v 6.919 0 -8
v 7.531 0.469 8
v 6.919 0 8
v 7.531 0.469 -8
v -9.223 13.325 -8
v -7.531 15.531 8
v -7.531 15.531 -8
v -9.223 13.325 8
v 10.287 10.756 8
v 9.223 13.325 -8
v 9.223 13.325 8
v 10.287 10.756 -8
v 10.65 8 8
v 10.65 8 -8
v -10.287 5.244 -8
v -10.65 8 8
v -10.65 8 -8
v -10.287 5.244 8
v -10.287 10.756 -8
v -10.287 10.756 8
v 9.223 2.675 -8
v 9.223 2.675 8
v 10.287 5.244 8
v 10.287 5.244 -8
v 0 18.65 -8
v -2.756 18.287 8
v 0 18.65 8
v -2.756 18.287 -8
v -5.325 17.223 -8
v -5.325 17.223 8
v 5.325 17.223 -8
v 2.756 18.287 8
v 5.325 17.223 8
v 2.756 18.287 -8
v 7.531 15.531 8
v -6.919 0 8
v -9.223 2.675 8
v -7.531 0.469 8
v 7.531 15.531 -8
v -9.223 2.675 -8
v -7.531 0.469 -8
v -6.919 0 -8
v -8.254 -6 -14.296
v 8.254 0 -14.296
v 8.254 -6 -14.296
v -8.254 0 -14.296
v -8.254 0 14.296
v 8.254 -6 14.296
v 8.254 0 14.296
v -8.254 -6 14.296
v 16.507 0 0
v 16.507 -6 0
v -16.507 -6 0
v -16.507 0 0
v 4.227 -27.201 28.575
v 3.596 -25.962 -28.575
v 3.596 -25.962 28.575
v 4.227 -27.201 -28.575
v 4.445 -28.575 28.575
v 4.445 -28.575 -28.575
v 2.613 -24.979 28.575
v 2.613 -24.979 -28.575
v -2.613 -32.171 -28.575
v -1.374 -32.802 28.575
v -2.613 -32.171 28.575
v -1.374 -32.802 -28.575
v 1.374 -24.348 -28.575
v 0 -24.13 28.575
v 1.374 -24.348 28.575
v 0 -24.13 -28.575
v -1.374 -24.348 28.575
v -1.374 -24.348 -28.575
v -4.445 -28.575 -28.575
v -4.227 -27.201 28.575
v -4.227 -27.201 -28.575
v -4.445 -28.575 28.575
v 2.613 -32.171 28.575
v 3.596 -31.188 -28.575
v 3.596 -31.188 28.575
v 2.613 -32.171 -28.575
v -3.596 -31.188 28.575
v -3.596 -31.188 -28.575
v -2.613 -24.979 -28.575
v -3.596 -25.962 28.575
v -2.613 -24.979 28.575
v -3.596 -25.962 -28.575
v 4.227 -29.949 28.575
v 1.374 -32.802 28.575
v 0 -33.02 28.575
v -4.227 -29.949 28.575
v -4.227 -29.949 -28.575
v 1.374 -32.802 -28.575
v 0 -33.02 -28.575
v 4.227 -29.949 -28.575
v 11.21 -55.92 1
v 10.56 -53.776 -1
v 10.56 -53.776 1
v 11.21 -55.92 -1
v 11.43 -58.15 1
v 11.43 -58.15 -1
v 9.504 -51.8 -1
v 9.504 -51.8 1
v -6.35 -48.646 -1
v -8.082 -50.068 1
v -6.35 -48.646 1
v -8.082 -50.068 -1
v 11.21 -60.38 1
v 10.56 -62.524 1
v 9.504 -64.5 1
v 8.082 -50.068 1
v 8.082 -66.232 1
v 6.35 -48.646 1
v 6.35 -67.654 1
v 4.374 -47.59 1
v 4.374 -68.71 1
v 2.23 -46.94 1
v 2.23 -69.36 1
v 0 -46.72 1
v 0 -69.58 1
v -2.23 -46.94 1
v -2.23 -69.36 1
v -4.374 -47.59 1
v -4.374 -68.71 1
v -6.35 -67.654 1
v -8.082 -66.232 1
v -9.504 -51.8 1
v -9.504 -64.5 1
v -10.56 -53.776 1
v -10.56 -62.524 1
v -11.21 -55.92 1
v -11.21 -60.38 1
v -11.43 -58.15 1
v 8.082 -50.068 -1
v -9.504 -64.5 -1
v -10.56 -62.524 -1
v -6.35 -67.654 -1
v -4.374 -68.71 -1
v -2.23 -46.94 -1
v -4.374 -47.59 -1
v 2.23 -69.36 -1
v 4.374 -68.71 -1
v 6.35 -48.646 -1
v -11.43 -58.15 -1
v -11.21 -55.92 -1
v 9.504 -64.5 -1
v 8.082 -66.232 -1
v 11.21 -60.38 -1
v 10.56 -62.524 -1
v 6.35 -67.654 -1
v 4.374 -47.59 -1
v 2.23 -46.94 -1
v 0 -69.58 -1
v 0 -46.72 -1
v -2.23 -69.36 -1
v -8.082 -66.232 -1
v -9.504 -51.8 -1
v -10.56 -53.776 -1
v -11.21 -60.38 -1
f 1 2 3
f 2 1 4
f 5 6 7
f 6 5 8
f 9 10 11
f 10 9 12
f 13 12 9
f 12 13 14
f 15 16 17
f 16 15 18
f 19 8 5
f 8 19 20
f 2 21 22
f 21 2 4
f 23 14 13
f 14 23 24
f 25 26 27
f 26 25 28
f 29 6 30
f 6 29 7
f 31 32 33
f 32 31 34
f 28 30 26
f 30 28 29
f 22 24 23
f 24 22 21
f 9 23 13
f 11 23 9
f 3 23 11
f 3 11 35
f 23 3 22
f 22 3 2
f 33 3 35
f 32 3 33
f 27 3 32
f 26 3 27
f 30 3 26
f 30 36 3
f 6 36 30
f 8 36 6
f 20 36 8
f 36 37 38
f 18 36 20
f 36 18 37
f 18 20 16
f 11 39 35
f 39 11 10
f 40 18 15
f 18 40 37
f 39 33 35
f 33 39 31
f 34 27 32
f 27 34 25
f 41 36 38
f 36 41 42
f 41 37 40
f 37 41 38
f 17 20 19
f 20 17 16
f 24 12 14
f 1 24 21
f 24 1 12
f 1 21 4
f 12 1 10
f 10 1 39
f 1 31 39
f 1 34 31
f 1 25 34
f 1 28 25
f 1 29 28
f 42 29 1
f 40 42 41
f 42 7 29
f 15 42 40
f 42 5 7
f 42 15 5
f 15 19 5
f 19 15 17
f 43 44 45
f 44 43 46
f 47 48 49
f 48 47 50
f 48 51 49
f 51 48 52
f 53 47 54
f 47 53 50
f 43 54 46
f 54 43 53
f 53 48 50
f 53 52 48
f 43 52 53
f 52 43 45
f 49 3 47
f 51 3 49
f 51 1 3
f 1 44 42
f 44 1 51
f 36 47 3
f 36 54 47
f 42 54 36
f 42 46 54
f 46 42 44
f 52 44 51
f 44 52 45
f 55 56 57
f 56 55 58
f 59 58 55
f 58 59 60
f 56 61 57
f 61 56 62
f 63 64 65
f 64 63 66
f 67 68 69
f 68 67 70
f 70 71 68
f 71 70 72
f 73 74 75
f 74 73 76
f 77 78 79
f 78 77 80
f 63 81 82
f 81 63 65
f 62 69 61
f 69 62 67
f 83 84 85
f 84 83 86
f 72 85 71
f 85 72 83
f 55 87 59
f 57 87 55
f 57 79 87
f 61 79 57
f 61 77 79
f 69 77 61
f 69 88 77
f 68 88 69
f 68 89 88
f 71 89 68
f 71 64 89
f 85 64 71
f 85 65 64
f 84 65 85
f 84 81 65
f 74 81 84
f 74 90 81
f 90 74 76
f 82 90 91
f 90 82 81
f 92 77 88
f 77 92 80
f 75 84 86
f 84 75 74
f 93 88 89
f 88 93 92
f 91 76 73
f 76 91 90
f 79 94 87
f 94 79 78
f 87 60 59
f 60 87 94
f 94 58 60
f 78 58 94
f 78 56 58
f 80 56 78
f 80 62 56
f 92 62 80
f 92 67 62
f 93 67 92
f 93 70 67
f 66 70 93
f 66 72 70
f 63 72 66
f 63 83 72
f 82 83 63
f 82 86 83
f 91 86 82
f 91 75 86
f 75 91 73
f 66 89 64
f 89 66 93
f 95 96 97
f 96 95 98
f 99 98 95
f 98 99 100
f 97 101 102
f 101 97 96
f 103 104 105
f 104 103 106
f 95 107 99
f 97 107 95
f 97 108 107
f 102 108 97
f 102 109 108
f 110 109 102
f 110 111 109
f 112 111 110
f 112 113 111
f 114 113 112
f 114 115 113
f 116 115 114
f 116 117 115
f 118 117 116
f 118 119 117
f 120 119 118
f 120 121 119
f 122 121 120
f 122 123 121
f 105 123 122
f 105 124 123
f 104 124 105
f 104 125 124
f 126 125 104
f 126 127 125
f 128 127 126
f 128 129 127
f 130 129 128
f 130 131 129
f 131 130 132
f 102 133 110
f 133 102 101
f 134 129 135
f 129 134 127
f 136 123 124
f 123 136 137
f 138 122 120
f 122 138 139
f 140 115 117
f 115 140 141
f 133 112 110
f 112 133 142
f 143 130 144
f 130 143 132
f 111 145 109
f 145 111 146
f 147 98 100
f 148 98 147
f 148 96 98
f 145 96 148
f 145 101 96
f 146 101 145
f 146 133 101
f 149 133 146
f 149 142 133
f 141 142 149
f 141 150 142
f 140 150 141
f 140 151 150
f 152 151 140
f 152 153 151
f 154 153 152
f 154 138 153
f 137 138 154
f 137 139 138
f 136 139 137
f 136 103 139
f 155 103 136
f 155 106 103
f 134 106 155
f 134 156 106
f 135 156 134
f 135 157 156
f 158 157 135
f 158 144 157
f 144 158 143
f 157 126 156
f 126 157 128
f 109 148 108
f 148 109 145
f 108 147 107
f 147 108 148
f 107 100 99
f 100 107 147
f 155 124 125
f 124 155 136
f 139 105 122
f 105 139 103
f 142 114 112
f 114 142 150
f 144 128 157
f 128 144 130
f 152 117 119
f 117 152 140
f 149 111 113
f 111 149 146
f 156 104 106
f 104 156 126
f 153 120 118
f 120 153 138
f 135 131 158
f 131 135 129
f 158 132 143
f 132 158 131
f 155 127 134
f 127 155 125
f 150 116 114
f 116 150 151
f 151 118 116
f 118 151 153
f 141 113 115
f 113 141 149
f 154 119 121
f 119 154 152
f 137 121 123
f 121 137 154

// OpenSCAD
// Auto-generated by scripts/author_from_manifest.py (Phase D.3).
// Source: data/phase_d_manifest.json (sku_intent='viking-vk200-pendent-135f').
// Do not hand-edit — regenerate from the manifest.
//
// @part viking_vk200_pendent_135f
// @kind sprinkler_head
// @category head.pendant.k56
// @display-name "Viking VK200 Pendent K5.6 SR 135°F"
// @mfg viking_group
// @mfg-pn VK200
// @listing UL FM
// @hazard-classes LH OH1
// @price-usd 13.10
// @install-minutes 8
// @crew journeyman
// @k-factor 5.6
// @orientation pendant
// @response standard
// @temperature 135F
// @param size_in number default=0.5 label="Size" unit="in"
// @port inlet position=[0,0.014,0] direction=[0,1,0] style=NPT_threaded size_in=0.5 role=drop

size_in = 0.5;
k_factor = 5.6;

length_mm   = 57.15;
body_dia_mm = 25.40;
thread_od   = 21.3;
thread_len  = 16;
deflector_d = body_dia_mm * 0.9;

 union() {
    translate([0, thread_len/2, 0])
        cylinder(h = thread_len, d = thread_od, center = true, $fn = 24);
    translate([0, -3, 0])
        rotate([90, 0, 0])
        cylinder(h = 6, d = thread_od * 1.55, $fn = 6, center = true);
    translate([0, -length_mm/2, 0])
        cylinder(h = length_mm, d = body_dia_mm * 0.35, center = true, $fn = 20);
    translate([0, -length_mm - 1, 0])
        cylinder(h = 2, d = deflector_d, center = true, $fn = 32);
}
